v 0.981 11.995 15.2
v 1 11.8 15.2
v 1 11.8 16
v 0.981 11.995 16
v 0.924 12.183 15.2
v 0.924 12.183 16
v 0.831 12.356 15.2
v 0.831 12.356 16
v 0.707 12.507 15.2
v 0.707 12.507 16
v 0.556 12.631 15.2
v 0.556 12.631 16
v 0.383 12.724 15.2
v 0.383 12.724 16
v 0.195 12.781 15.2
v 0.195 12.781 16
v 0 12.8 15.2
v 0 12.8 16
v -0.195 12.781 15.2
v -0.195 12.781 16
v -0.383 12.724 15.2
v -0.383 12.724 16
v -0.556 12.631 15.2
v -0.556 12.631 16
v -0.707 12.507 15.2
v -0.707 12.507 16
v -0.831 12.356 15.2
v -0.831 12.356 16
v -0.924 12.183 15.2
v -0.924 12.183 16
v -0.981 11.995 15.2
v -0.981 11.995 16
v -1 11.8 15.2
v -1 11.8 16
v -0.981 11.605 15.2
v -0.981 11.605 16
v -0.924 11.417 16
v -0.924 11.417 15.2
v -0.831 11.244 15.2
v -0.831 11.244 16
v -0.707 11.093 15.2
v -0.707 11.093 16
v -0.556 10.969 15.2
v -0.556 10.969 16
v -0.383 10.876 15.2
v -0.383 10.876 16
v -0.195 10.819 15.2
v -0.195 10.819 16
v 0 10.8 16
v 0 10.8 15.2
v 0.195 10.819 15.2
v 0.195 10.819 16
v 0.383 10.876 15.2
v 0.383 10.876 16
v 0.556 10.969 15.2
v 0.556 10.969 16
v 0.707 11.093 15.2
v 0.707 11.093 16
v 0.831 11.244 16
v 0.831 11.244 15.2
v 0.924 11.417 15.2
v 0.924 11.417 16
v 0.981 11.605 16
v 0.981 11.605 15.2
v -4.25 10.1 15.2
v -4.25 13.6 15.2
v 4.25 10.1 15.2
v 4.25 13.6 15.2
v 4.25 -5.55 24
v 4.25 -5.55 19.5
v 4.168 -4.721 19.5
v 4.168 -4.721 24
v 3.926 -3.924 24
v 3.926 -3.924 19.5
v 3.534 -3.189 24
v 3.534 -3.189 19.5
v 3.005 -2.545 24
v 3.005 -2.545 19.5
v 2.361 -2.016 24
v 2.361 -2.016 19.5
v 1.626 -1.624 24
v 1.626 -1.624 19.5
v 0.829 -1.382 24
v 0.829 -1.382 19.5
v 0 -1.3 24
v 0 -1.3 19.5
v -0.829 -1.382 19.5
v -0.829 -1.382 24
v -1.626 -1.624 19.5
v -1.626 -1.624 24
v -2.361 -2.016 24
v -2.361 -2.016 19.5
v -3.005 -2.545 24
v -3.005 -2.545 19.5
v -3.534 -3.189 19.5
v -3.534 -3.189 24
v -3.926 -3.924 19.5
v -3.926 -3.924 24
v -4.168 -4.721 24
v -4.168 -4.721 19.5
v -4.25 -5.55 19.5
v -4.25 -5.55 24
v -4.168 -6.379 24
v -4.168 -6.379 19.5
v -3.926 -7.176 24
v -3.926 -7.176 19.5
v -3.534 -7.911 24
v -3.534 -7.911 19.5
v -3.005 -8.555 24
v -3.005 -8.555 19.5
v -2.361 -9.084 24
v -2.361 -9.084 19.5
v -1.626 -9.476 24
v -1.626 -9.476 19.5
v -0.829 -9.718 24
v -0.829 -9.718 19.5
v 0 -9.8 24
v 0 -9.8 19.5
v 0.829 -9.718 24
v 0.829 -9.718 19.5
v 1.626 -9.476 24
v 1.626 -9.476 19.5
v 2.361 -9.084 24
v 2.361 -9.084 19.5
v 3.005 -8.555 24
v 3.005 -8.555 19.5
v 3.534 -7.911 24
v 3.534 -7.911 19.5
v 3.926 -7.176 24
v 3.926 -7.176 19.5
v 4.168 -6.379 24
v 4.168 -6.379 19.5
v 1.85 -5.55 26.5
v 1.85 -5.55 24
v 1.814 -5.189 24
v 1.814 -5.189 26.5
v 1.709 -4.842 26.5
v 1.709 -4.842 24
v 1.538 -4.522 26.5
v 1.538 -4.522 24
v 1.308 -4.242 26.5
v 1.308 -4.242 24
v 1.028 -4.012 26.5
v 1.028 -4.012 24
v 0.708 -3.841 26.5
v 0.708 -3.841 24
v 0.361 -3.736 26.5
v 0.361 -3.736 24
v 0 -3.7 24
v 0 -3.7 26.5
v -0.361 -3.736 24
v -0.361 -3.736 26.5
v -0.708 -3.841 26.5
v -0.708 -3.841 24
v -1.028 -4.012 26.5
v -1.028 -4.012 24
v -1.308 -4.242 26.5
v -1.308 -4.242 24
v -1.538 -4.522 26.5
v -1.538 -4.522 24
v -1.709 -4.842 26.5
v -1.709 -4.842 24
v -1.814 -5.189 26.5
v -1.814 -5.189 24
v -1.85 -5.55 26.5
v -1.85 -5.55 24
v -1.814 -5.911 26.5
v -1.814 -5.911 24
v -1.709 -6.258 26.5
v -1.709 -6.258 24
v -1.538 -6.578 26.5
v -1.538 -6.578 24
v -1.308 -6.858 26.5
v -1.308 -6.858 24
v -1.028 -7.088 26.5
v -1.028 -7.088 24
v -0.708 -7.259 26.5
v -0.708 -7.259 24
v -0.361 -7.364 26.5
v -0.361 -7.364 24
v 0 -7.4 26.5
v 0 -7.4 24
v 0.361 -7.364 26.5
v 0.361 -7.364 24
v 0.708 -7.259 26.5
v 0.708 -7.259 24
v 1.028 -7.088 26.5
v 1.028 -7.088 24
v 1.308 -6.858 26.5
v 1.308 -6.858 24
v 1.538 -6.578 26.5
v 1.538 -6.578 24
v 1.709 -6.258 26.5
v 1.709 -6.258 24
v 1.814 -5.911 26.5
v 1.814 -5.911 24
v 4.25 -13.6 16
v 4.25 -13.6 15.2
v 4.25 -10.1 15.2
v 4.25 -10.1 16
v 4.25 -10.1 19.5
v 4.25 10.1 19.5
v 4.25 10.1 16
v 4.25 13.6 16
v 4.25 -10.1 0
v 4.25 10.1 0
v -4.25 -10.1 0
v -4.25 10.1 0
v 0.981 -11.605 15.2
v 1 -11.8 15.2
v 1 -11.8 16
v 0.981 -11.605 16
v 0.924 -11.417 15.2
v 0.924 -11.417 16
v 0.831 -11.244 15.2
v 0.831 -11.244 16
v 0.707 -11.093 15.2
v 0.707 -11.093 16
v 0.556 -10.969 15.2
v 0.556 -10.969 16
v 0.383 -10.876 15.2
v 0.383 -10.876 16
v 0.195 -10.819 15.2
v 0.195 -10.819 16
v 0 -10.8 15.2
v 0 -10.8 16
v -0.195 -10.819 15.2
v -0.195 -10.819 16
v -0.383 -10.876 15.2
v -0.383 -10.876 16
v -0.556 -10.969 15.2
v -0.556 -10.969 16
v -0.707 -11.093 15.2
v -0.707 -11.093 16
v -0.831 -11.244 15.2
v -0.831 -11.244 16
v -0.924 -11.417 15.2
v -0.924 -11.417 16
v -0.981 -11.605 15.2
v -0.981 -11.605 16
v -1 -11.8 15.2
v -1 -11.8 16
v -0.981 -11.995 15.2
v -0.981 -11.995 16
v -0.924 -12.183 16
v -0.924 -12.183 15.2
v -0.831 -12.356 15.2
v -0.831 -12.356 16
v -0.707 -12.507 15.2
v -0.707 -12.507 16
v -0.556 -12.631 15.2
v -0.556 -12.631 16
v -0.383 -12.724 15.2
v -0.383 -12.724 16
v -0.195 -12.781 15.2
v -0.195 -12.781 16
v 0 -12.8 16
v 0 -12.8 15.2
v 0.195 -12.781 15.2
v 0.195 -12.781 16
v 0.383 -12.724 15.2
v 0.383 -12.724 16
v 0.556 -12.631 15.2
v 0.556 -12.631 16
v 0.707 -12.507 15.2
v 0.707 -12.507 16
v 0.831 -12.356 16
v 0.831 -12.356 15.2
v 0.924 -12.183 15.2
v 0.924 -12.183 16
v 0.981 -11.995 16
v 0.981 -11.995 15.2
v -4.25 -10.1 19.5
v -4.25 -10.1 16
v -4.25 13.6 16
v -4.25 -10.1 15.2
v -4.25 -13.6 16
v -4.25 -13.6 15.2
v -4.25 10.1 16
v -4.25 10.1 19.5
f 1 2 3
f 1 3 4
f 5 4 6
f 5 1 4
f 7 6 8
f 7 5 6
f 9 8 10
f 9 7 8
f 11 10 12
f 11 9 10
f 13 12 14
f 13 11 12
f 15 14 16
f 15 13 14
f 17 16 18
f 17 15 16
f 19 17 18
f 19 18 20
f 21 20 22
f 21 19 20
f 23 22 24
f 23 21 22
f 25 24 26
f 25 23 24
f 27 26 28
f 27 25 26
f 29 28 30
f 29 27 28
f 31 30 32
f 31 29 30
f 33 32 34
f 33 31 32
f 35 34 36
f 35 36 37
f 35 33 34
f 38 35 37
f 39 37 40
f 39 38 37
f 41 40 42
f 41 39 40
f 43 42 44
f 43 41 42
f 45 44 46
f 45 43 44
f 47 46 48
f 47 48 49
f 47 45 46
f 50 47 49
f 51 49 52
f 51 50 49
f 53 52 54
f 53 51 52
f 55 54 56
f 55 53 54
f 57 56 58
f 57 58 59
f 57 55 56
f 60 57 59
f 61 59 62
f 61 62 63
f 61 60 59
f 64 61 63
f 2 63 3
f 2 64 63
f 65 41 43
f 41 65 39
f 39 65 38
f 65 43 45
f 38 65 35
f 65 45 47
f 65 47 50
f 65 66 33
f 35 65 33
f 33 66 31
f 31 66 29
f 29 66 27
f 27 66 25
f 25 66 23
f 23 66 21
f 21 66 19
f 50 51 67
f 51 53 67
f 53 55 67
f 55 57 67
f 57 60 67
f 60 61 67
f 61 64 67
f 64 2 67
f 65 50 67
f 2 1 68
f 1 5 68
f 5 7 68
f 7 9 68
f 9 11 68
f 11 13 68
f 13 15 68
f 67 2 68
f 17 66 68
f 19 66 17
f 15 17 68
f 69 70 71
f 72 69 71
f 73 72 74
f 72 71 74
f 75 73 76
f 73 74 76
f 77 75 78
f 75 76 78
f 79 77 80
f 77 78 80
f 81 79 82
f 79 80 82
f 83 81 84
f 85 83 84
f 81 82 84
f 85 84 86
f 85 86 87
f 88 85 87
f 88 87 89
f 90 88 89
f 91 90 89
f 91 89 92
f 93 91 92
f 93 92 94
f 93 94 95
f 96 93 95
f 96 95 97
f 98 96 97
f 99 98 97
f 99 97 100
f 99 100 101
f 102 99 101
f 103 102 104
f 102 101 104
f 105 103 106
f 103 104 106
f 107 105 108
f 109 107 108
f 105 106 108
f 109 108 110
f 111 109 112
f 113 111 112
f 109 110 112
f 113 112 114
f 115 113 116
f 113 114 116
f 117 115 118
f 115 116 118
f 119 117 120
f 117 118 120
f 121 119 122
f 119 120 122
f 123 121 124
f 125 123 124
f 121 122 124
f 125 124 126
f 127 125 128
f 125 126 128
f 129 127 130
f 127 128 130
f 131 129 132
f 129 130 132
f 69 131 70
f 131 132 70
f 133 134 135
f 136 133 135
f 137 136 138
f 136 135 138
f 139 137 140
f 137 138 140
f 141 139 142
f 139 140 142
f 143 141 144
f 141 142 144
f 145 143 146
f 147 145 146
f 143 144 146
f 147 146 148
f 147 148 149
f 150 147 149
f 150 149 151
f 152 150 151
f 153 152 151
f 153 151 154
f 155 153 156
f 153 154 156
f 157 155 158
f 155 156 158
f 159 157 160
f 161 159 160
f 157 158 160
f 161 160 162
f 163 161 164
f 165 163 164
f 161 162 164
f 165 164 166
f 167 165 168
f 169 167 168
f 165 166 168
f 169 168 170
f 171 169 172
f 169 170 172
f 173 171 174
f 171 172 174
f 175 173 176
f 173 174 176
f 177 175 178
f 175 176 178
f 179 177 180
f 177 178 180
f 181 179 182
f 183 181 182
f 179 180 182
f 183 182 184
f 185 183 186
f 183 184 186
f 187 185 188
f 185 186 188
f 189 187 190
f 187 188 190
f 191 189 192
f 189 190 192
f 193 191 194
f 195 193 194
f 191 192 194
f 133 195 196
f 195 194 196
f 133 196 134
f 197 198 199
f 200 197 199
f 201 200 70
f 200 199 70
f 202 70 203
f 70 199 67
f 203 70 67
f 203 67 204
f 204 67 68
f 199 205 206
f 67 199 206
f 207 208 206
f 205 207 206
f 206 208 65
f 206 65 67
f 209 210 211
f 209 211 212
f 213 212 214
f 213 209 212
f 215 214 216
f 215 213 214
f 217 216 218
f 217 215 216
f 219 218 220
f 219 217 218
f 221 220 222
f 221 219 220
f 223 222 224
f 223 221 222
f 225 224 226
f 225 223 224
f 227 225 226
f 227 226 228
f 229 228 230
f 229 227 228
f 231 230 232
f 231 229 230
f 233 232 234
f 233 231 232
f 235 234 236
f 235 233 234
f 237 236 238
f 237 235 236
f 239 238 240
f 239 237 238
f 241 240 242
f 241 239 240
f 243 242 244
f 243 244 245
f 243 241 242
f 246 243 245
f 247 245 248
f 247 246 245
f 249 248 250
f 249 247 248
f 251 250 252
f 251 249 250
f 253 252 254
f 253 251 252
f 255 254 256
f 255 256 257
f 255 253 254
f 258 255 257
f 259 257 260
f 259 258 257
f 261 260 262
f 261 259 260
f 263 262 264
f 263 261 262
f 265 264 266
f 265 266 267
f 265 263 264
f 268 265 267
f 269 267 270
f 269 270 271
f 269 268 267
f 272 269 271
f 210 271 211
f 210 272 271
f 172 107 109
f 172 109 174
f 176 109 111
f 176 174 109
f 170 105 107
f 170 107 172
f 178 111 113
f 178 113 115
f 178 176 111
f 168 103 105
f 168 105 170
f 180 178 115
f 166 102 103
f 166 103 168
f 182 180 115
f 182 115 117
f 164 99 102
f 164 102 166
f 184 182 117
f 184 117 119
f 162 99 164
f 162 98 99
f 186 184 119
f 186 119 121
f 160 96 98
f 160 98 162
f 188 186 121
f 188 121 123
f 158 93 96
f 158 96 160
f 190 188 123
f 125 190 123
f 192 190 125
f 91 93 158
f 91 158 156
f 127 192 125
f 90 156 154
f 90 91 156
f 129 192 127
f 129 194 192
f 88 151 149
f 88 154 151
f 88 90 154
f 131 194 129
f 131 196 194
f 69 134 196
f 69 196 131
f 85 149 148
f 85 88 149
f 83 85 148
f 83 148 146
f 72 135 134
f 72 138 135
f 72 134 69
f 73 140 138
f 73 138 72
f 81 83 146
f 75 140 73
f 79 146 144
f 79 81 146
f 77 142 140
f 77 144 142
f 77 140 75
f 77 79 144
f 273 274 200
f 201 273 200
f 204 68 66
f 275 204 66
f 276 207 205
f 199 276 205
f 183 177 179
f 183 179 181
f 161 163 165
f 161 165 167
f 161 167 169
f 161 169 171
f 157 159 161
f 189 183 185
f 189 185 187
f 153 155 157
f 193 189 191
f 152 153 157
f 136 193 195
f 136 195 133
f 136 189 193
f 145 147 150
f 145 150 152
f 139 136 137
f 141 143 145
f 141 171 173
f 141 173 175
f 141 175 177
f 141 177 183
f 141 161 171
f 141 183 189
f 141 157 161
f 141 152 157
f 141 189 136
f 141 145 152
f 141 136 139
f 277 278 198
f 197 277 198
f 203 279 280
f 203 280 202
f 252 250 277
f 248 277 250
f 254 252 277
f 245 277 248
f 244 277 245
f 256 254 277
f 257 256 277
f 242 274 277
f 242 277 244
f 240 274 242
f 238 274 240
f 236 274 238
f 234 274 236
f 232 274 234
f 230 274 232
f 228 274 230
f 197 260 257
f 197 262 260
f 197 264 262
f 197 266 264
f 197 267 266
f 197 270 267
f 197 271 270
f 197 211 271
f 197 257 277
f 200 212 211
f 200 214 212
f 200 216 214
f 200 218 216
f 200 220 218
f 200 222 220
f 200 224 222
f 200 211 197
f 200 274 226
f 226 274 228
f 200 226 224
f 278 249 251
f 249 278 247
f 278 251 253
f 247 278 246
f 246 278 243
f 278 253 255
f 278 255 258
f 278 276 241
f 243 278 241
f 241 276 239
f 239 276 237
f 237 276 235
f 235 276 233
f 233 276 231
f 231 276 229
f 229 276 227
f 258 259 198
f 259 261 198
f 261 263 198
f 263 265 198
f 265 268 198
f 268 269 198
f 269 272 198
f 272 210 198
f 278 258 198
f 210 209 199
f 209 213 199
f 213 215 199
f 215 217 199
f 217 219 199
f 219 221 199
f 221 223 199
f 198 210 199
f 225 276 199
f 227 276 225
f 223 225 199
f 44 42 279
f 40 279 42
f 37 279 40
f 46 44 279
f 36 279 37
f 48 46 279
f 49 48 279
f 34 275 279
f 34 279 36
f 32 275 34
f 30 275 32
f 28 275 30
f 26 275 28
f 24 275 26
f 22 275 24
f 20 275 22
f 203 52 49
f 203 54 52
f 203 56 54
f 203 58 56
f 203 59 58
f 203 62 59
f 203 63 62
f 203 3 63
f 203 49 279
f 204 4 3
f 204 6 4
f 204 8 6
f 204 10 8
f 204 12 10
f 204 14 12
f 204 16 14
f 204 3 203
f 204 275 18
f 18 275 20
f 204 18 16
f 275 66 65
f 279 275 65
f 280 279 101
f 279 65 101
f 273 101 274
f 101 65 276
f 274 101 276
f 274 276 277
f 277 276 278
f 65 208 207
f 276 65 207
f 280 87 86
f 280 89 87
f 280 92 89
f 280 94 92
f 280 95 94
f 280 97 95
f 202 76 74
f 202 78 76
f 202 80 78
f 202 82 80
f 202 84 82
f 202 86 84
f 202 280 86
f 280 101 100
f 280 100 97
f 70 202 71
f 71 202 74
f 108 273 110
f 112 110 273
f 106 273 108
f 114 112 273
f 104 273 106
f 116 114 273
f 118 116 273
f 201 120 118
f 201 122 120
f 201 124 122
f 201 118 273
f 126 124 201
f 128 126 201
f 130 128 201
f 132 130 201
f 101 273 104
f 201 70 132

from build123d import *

# Parameters (mm, degrees)
SKETCH_W     = 8.5
SKETCH_H     = 20.2
PAD_DEPTH    = 15.2
SKETCH001_R  = 1
PAD001_DEPTH = 0.8
SKETCH002_W  = 8.5
SKETCH002_H  = 20.2
PAD002_DEPTH = 3.5
SKETCH003_R  = 4.25
PAD003_DEPTH = 4.5
SKETCH004_R  = 1.85
PAD004_DEPTH = 2.5


with BuildPart() as part:
    # Sketch → Pad (new body)
    with BuildSketch(Plane.XY):
        Rectangle(SKETCH_W, SKETCH_H)
    extrude(amount=PAD_DEPTH)

    # Sketch001 (on Face6 of Pad) → Pad001 (join)
    with BuildSketch(Plane.XY.offset(15.2)):
        Polygon((4.25, 10.1), (4.25, 13.6), (-4.25, 13.6), (-4.25, 10.1), (-4.25, -10.1), (-4.25, -13.6), (4.25, -13.6), (4.25, -10.1), align=None)
        with Locations((0, 11.8)):
            Circle(SKETCH001_R, mode=Mode.SUBTRACT)
        with Locations((0, -11.8)):
            Circle(SKETCH001_R, mode=Mode.SUBTRACT)
    extrude(amount=PAD001_DEPTH)

    # Sketch002 (on Face9 of Pad001) → Pad002 (join)
    with BuildSketch(Plane.XY.offset(16)):
        Rectangle(SKETCH002_W, SKETCH002_H)
    extrude(amount=PAD002_DEPTH)

    # Sketch003 (on Face14 of Pad002) → Pad003 (join)
    with BuildSketch(Plane.XY.offset(19.5)):
        with Locations((0, -5.55)):
            Circle(SKETCH003_R)
    extrude(amount=PAD003_DEPTH)

    # Sketch004 (on Face19 of Pad003) → Pad004 (join)
    with BuildSketch(Plane.XY.offset(24)):
        with Locations((0, -5.55)):
            Circle(SKETCH004_R)
    extrude(amount=PAD004_DEPTH)


solid = part.part
